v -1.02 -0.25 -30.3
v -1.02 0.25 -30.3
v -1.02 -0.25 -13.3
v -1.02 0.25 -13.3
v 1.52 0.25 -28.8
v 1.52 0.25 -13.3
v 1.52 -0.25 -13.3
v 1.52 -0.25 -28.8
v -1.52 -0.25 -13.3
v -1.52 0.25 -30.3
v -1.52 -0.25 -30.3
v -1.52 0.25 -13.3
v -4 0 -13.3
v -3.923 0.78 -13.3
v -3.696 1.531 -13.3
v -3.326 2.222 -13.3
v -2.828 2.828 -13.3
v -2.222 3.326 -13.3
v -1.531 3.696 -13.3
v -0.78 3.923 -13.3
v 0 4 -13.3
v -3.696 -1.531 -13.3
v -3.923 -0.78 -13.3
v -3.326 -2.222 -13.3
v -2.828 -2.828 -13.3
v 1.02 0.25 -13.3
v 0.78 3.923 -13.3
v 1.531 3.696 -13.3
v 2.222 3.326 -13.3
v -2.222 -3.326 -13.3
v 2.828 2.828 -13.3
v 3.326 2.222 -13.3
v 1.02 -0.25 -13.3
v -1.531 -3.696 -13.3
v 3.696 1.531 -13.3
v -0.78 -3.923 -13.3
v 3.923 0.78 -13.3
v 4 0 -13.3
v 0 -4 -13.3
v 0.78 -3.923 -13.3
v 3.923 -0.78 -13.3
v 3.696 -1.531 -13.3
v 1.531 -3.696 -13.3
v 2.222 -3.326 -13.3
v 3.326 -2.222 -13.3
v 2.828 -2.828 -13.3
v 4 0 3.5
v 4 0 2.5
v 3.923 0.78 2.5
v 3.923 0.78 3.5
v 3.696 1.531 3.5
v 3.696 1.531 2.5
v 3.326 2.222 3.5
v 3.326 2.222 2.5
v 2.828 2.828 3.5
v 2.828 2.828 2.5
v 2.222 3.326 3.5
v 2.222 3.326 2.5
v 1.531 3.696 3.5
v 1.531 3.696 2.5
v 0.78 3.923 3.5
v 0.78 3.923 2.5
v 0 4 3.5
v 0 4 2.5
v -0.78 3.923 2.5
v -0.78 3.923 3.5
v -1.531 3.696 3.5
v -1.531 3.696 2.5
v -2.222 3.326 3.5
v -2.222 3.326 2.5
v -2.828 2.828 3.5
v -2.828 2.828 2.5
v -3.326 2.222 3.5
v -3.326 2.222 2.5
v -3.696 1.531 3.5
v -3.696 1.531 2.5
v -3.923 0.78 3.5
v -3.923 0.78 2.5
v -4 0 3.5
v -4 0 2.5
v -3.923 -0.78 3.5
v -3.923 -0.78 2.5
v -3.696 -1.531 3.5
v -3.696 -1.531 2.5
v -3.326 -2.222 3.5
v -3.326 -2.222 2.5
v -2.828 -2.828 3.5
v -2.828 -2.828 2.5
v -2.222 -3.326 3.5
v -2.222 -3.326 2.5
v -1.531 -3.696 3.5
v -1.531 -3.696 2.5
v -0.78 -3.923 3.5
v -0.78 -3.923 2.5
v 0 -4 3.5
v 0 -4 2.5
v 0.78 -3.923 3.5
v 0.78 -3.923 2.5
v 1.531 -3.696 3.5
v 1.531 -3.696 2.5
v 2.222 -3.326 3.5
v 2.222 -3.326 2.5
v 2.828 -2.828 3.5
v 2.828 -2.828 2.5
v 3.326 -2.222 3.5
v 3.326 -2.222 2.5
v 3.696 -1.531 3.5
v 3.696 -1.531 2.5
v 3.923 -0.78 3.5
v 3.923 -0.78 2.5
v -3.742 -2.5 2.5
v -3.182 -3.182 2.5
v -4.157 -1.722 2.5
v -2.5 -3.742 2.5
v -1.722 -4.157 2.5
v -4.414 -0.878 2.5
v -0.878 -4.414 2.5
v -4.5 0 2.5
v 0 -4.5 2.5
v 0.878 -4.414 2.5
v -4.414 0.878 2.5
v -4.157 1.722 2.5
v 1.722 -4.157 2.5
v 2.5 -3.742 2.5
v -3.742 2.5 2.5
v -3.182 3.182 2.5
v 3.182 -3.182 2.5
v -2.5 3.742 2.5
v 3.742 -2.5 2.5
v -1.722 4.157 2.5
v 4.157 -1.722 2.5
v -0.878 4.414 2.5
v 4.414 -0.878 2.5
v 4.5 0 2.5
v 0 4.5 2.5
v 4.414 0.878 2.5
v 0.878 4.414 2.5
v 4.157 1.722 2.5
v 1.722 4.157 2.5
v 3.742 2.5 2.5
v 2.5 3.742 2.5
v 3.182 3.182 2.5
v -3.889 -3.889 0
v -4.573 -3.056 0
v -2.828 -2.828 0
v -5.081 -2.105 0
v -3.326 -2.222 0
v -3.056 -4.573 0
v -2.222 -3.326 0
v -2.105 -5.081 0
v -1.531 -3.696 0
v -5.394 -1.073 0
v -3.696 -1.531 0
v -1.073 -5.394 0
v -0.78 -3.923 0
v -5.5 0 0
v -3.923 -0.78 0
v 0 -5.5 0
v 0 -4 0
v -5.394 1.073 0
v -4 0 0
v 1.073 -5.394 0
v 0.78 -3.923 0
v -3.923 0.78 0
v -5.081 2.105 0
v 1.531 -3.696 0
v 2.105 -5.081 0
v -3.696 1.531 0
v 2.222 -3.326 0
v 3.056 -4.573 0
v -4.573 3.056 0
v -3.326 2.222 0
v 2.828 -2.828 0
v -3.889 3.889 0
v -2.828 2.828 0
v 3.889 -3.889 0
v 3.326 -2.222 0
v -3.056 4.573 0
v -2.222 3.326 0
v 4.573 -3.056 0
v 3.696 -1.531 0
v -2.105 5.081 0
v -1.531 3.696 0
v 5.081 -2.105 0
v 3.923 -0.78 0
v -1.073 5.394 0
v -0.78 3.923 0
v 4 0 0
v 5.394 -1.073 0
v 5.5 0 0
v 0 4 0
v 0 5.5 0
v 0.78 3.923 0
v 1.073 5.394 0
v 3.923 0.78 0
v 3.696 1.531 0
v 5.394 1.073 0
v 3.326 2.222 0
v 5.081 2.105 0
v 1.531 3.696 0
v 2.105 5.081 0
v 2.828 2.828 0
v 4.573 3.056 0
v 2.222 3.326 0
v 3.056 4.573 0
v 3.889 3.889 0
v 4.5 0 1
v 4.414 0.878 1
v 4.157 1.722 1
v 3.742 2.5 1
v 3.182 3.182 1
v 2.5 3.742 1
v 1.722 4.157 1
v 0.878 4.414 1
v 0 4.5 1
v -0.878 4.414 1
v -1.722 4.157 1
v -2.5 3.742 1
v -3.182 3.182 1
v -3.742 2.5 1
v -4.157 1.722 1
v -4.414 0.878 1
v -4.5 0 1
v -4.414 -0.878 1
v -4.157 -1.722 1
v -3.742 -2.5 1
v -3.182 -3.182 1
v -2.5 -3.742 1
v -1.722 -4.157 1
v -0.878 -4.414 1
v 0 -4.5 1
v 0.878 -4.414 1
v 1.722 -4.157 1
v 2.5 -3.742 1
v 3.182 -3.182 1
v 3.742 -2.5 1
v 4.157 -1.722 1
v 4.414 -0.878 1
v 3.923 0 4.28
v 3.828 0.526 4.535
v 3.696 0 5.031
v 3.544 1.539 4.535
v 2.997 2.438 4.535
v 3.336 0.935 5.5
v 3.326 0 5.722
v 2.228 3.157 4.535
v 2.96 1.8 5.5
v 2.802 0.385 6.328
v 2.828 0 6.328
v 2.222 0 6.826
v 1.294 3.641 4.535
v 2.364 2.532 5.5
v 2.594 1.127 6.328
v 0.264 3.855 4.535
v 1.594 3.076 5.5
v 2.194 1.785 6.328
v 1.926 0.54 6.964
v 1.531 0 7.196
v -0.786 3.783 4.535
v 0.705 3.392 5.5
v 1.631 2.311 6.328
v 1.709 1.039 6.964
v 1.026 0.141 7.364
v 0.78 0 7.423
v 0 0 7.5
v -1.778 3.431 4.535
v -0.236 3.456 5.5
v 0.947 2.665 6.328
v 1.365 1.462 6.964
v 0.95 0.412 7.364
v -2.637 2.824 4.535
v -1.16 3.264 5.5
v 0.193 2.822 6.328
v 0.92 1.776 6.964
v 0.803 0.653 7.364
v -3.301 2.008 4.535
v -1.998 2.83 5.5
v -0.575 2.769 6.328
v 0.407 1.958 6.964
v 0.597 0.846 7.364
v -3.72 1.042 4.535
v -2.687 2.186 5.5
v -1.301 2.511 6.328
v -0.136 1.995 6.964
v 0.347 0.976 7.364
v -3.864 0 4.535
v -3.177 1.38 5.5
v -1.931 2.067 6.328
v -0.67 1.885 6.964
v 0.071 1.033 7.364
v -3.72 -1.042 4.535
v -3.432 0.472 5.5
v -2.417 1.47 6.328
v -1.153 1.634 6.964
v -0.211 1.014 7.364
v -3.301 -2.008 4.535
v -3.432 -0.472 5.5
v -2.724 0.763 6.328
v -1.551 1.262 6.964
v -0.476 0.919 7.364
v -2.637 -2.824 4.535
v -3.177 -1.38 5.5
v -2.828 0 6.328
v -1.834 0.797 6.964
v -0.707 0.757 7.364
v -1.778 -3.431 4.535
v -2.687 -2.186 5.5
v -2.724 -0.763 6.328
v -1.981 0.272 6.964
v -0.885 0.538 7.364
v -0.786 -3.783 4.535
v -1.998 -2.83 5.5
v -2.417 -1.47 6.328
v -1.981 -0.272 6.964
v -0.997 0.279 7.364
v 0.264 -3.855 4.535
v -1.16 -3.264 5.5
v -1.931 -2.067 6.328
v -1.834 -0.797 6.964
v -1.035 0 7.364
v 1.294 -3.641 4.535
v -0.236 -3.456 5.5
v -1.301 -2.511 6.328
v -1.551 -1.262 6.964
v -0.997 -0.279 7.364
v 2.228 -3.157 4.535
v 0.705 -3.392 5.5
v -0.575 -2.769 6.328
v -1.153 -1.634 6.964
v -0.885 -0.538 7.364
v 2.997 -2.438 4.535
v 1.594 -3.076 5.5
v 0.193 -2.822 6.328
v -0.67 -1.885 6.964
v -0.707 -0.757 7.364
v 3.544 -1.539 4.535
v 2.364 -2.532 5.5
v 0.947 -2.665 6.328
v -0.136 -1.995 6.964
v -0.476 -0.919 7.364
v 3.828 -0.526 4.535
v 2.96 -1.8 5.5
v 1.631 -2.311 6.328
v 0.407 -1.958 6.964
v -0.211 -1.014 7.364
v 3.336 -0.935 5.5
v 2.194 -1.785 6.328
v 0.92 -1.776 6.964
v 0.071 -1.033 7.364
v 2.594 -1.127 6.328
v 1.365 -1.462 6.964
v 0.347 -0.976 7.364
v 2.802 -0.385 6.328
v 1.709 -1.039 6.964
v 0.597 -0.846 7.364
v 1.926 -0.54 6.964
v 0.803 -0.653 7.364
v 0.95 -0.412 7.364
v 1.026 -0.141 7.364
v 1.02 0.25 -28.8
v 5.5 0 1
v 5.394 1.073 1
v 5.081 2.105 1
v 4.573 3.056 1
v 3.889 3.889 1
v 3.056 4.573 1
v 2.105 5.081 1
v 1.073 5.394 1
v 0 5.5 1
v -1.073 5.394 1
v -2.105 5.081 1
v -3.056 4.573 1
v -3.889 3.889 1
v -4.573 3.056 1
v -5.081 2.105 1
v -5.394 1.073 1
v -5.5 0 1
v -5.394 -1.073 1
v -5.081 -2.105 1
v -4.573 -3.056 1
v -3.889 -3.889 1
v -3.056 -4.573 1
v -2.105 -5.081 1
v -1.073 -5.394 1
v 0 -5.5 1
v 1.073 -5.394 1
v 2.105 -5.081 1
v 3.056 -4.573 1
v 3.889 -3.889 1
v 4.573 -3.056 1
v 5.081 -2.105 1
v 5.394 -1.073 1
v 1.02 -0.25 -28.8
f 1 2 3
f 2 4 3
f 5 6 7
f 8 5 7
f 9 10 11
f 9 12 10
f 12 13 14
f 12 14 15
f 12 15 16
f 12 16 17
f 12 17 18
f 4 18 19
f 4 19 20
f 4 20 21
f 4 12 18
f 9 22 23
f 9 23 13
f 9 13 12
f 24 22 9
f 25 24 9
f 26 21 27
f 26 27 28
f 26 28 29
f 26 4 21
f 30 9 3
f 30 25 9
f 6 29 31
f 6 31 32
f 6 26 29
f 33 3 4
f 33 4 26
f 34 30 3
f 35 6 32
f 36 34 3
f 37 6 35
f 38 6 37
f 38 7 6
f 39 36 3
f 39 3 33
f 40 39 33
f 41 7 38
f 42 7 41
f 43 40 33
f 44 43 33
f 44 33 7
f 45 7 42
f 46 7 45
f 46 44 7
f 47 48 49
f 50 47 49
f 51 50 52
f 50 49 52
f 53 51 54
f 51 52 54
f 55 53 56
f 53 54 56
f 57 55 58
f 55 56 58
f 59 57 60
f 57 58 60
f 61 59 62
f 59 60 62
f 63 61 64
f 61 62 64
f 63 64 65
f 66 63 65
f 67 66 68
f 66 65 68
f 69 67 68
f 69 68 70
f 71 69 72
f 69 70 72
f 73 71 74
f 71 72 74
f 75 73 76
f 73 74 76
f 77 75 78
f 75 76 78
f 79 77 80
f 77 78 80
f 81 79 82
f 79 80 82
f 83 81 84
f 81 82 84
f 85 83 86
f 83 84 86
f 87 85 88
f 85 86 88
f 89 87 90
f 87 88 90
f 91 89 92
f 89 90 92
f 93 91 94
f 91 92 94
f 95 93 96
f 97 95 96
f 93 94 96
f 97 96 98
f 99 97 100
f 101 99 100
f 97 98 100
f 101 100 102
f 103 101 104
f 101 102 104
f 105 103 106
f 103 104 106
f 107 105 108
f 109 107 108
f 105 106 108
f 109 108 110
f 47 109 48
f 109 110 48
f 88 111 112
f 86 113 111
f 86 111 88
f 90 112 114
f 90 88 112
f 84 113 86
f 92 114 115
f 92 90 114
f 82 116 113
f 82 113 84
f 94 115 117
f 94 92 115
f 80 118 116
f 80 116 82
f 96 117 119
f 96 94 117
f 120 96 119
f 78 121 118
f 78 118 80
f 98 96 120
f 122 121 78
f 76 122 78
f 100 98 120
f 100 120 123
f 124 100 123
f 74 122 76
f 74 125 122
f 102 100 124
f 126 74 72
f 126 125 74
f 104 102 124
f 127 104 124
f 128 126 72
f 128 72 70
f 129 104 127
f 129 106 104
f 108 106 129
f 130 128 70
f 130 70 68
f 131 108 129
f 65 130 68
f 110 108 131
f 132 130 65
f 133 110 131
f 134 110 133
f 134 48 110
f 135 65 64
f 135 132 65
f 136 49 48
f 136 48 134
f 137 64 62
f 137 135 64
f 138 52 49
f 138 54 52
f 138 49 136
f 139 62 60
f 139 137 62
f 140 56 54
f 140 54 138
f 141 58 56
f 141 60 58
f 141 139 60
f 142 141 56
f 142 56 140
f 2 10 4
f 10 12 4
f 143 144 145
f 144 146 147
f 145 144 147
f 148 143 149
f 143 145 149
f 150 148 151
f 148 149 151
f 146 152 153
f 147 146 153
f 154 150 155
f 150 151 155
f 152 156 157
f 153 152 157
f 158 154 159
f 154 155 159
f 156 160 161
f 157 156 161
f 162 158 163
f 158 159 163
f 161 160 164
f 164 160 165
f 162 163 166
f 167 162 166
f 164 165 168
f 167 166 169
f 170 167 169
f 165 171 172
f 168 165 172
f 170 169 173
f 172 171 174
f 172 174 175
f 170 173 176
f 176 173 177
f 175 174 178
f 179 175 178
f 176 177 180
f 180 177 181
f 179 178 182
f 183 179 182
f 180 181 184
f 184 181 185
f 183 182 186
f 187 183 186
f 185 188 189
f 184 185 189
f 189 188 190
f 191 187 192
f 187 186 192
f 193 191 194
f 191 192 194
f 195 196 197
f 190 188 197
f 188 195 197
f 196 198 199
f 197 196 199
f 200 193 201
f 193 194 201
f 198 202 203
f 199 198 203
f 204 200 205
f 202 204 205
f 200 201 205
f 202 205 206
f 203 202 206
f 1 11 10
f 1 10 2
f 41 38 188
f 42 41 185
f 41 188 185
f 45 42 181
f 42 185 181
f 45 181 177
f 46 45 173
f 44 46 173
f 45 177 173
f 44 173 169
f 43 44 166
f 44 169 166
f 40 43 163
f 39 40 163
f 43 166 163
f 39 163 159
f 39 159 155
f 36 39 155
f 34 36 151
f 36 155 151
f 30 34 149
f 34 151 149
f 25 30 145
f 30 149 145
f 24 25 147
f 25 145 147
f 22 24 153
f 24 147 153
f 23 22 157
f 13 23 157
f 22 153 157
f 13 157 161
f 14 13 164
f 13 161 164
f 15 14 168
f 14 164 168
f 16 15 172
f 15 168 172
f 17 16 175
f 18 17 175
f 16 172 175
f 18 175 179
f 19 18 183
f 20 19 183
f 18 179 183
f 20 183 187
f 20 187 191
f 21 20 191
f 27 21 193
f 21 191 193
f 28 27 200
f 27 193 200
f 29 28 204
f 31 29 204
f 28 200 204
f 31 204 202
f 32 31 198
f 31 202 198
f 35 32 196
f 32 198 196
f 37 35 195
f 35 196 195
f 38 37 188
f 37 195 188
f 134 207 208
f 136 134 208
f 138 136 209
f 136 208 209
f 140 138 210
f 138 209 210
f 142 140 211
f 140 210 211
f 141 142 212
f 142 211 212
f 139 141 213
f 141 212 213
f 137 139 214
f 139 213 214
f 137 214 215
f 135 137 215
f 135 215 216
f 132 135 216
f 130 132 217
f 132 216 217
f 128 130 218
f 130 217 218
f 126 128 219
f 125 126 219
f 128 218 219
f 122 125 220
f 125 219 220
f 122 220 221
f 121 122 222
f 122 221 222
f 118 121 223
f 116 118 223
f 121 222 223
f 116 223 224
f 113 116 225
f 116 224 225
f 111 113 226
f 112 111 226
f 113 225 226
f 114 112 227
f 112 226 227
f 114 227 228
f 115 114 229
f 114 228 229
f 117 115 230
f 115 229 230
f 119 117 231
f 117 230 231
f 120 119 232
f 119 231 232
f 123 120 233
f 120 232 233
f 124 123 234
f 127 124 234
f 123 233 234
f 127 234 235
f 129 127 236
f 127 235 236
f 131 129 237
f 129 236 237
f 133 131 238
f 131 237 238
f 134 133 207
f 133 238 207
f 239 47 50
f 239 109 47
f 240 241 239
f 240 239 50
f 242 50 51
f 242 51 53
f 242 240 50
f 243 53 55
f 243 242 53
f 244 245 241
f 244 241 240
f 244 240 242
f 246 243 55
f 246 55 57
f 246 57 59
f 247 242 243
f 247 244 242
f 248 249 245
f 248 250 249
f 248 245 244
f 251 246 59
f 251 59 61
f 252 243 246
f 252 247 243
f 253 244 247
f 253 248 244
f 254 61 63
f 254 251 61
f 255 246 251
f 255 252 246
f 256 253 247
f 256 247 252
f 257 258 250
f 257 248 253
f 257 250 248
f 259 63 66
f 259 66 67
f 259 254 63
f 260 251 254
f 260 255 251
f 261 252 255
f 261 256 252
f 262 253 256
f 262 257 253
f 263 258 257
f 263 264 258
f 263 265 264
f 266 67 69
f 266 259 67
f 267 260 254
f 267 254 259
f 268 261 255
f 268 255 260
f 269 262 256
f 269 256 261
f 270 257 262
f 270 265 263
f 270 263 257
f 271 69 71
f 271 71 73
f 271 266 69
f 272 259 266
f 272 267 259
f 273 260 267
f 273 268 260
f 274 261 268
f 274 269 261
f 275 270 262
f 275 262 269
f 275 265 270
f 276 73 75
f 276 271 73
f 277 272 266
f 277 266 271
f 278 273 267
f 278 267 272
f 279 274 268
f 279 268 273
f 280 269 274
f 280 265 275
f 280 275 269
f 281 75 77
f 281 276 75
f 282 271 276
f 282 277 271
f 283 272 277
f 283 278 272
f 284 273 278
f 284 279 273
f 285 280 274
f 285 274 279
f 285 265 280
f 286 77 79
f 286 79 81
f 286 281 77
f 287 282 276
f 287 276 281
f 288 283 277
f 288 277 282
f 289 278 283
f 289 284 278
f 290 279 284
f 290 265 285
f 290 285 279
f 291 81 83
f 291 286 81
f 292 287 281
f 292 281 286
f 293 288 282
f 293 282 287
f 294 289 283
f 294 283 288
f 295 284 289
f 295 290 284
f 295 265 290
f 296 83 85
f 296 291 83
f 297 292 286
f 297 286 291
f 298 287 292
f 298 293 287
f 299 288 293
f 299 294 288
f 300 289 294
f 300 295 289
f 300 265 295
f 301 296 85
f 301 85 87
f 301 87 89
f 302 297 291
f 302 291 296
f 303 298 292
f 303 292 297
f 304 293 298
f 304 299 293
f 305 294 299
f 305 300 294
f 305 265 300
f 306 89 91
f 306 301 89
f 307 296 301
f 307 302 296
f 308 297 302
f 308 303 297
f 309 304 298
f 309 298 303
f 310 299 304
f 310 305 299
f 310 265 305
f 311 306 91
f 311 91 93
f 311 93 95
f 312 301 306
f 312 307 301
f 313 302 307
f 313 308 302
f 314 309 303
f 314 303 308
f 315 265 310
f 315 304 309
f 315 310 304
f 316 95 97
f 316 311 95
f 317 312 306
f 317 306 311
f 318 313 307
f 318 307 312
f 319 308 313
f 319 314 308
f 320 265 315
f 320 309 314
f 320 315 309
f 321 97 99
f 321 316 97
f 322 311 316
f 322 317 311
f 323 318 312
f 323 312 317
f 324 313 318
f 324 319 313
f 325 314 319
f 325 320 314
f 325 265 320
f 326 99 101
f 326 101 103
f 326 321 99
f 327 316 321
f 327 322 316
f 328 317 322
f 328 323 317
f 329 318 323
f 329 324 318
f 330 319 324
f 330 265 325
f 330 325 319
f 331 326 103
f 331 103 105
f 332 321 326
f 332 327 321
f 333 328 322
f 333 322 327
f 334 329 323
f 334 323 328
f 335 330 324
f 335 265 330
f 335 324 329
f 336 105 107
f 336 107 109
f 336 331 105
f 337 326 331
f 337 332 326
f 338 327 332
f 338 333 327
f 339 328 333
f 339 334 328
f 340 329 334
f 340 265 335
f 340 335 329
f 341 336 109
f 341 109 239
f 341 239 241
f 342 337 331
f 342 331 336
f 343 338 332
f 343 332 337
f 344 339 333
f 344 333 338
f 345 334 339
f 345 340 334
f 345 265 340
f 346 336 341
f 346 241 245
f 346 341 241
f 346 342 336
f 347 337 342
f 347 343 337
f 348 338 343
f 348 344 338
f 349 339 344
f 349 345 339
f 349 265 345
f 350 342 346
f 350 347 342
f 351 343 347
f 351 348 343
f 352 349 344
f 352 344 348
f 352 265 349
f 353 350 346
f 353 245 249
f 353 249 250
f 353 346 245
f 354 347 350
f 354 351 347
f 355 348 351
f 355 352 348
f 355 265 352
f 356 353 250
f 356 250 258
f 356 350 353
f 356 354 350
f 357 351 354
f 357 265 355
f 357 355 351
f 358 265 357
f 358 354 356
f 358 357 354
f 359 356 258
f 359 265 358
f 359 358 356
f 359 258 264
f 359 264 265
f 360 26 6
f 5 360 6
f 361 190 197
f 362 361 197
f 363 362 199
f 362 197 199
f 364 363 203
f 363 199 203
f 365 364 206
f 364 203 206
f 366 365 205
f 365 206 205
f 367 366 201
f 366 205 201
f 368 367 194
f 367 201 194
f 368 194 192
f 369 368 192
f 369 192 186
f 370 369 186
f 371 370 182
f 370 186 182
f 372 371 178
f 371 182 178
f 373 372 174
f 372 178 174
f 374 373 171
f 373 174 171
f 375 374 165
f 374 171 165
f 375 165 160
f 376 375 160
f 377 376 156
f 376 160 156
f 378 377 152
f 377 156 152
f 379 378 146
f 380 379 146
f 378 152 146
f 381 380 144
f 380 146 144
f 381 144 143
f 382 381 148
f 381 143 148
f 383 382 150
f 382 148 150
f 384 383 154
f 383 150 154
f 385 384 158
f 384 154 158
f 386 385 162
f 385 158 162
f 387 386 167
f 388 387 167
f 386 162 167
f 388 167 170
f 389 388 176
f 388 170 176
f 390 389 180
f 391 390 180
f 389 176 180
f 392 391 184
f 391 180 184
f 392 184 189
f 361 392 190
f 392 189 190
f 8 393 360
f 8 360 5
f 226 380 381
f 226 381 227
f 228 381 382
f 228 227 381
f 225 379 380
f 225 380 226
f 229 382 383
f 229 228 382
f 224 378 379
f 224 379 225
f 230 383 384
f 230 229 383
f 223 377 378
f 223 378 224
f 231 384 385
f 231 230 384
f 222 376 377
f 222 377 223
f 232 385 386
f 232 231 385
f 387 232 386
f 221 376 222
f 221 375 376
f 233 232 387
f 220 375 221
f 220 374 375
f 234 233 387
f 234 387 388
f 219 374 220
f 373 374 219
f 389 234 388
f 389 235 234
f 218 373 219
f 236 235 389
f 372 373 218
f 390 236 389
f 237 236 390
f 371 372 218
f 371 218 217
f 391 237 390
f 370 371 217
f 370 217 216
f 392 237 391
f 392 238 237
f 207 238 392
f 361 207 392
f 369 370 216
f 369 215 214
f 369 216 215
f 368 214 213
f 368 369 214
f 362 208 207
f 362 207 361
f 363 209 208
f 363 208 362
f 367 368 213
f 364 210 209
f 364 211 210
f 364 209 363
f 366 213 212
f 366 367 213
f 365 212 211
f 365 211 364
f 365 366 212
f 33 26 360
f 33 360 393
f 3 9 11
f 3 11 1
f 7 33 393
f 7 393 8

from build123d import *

# Parameters (mm, degrees)
F0_R      = 5.5
F1_DEPTH  = 1
F2_R      = 4.5
F3_DEPTH  = 1.5
F4_R      = 4
F5_DEPTH  = 5
F6_R      = 4
F7_R      = 4
F8_DEPTH  = 13.3
F9_W      = 0.5
F9_H      = 0.5
F10_DEPTH = 15.5
F11_W     = 0.5
F11_H     = 0.5
F12_DEPTH = 1.5


with BuildPart() as f1:
    # F0 (on Top) → F1 (new body)
    with BuildSketch(Plane.XY):
        Circle(F0_R)
    extrude(amount=F1_DEPTH)

    # F2 (on face) → F3 (join)
    with BuildSketch(Plane.XY.offset(1)):
        Circle(F2_R)
    extrude(amount=F3_DEPTH)

    # F4 (on face) → F5 (join)
    with BuildSketch(Plane.XY.offset(2.5)):
        Circle(F4_R)
    extrude(amount=F5_DEPTH)

    # F6
    f6_edges = [f1.edges().sort_by_distance(p)[0] for p in [
        (-4, 0, 7.5),
    ]]
    fillet(f6_edges, radius=F6_R)

    # F7 (on face) → F8 (join)
    with BuildSketch(Plane(origin=(0, 0, 0), x_dir=(1, 0, 0), z_dir=(0, 0, -1))):
        Circle(F7_R)
    extrude(amount=F8_DEPTH)

    # F9 (on face) → F10 (join)
    with BuildSketch(Plane(origin=(0, 0, -13.3), x_dir=(1, 0, 0), z_dir=(0, 0, -1))):
        with Locations((-1.27, 0)):
            Rectangle(F9_W, F9_H)
        with Locations((1.27, 0)):
            Rectangle(F9_W, F9_H)
    extrude(amount=F10_DEPTH)

    # F11 (on face) → F12 (join)
    with BuildSketch(Plane(origin=(0, 0, -28.8), x_dir=(1, 0, 0), z_dir=(0, 0, -1))):
        with Locations((-1.27, 0)):
            Rectangle(F11_W, F11_H)
    extrude(amount=F12_DEPTH)


solid = f1.part
